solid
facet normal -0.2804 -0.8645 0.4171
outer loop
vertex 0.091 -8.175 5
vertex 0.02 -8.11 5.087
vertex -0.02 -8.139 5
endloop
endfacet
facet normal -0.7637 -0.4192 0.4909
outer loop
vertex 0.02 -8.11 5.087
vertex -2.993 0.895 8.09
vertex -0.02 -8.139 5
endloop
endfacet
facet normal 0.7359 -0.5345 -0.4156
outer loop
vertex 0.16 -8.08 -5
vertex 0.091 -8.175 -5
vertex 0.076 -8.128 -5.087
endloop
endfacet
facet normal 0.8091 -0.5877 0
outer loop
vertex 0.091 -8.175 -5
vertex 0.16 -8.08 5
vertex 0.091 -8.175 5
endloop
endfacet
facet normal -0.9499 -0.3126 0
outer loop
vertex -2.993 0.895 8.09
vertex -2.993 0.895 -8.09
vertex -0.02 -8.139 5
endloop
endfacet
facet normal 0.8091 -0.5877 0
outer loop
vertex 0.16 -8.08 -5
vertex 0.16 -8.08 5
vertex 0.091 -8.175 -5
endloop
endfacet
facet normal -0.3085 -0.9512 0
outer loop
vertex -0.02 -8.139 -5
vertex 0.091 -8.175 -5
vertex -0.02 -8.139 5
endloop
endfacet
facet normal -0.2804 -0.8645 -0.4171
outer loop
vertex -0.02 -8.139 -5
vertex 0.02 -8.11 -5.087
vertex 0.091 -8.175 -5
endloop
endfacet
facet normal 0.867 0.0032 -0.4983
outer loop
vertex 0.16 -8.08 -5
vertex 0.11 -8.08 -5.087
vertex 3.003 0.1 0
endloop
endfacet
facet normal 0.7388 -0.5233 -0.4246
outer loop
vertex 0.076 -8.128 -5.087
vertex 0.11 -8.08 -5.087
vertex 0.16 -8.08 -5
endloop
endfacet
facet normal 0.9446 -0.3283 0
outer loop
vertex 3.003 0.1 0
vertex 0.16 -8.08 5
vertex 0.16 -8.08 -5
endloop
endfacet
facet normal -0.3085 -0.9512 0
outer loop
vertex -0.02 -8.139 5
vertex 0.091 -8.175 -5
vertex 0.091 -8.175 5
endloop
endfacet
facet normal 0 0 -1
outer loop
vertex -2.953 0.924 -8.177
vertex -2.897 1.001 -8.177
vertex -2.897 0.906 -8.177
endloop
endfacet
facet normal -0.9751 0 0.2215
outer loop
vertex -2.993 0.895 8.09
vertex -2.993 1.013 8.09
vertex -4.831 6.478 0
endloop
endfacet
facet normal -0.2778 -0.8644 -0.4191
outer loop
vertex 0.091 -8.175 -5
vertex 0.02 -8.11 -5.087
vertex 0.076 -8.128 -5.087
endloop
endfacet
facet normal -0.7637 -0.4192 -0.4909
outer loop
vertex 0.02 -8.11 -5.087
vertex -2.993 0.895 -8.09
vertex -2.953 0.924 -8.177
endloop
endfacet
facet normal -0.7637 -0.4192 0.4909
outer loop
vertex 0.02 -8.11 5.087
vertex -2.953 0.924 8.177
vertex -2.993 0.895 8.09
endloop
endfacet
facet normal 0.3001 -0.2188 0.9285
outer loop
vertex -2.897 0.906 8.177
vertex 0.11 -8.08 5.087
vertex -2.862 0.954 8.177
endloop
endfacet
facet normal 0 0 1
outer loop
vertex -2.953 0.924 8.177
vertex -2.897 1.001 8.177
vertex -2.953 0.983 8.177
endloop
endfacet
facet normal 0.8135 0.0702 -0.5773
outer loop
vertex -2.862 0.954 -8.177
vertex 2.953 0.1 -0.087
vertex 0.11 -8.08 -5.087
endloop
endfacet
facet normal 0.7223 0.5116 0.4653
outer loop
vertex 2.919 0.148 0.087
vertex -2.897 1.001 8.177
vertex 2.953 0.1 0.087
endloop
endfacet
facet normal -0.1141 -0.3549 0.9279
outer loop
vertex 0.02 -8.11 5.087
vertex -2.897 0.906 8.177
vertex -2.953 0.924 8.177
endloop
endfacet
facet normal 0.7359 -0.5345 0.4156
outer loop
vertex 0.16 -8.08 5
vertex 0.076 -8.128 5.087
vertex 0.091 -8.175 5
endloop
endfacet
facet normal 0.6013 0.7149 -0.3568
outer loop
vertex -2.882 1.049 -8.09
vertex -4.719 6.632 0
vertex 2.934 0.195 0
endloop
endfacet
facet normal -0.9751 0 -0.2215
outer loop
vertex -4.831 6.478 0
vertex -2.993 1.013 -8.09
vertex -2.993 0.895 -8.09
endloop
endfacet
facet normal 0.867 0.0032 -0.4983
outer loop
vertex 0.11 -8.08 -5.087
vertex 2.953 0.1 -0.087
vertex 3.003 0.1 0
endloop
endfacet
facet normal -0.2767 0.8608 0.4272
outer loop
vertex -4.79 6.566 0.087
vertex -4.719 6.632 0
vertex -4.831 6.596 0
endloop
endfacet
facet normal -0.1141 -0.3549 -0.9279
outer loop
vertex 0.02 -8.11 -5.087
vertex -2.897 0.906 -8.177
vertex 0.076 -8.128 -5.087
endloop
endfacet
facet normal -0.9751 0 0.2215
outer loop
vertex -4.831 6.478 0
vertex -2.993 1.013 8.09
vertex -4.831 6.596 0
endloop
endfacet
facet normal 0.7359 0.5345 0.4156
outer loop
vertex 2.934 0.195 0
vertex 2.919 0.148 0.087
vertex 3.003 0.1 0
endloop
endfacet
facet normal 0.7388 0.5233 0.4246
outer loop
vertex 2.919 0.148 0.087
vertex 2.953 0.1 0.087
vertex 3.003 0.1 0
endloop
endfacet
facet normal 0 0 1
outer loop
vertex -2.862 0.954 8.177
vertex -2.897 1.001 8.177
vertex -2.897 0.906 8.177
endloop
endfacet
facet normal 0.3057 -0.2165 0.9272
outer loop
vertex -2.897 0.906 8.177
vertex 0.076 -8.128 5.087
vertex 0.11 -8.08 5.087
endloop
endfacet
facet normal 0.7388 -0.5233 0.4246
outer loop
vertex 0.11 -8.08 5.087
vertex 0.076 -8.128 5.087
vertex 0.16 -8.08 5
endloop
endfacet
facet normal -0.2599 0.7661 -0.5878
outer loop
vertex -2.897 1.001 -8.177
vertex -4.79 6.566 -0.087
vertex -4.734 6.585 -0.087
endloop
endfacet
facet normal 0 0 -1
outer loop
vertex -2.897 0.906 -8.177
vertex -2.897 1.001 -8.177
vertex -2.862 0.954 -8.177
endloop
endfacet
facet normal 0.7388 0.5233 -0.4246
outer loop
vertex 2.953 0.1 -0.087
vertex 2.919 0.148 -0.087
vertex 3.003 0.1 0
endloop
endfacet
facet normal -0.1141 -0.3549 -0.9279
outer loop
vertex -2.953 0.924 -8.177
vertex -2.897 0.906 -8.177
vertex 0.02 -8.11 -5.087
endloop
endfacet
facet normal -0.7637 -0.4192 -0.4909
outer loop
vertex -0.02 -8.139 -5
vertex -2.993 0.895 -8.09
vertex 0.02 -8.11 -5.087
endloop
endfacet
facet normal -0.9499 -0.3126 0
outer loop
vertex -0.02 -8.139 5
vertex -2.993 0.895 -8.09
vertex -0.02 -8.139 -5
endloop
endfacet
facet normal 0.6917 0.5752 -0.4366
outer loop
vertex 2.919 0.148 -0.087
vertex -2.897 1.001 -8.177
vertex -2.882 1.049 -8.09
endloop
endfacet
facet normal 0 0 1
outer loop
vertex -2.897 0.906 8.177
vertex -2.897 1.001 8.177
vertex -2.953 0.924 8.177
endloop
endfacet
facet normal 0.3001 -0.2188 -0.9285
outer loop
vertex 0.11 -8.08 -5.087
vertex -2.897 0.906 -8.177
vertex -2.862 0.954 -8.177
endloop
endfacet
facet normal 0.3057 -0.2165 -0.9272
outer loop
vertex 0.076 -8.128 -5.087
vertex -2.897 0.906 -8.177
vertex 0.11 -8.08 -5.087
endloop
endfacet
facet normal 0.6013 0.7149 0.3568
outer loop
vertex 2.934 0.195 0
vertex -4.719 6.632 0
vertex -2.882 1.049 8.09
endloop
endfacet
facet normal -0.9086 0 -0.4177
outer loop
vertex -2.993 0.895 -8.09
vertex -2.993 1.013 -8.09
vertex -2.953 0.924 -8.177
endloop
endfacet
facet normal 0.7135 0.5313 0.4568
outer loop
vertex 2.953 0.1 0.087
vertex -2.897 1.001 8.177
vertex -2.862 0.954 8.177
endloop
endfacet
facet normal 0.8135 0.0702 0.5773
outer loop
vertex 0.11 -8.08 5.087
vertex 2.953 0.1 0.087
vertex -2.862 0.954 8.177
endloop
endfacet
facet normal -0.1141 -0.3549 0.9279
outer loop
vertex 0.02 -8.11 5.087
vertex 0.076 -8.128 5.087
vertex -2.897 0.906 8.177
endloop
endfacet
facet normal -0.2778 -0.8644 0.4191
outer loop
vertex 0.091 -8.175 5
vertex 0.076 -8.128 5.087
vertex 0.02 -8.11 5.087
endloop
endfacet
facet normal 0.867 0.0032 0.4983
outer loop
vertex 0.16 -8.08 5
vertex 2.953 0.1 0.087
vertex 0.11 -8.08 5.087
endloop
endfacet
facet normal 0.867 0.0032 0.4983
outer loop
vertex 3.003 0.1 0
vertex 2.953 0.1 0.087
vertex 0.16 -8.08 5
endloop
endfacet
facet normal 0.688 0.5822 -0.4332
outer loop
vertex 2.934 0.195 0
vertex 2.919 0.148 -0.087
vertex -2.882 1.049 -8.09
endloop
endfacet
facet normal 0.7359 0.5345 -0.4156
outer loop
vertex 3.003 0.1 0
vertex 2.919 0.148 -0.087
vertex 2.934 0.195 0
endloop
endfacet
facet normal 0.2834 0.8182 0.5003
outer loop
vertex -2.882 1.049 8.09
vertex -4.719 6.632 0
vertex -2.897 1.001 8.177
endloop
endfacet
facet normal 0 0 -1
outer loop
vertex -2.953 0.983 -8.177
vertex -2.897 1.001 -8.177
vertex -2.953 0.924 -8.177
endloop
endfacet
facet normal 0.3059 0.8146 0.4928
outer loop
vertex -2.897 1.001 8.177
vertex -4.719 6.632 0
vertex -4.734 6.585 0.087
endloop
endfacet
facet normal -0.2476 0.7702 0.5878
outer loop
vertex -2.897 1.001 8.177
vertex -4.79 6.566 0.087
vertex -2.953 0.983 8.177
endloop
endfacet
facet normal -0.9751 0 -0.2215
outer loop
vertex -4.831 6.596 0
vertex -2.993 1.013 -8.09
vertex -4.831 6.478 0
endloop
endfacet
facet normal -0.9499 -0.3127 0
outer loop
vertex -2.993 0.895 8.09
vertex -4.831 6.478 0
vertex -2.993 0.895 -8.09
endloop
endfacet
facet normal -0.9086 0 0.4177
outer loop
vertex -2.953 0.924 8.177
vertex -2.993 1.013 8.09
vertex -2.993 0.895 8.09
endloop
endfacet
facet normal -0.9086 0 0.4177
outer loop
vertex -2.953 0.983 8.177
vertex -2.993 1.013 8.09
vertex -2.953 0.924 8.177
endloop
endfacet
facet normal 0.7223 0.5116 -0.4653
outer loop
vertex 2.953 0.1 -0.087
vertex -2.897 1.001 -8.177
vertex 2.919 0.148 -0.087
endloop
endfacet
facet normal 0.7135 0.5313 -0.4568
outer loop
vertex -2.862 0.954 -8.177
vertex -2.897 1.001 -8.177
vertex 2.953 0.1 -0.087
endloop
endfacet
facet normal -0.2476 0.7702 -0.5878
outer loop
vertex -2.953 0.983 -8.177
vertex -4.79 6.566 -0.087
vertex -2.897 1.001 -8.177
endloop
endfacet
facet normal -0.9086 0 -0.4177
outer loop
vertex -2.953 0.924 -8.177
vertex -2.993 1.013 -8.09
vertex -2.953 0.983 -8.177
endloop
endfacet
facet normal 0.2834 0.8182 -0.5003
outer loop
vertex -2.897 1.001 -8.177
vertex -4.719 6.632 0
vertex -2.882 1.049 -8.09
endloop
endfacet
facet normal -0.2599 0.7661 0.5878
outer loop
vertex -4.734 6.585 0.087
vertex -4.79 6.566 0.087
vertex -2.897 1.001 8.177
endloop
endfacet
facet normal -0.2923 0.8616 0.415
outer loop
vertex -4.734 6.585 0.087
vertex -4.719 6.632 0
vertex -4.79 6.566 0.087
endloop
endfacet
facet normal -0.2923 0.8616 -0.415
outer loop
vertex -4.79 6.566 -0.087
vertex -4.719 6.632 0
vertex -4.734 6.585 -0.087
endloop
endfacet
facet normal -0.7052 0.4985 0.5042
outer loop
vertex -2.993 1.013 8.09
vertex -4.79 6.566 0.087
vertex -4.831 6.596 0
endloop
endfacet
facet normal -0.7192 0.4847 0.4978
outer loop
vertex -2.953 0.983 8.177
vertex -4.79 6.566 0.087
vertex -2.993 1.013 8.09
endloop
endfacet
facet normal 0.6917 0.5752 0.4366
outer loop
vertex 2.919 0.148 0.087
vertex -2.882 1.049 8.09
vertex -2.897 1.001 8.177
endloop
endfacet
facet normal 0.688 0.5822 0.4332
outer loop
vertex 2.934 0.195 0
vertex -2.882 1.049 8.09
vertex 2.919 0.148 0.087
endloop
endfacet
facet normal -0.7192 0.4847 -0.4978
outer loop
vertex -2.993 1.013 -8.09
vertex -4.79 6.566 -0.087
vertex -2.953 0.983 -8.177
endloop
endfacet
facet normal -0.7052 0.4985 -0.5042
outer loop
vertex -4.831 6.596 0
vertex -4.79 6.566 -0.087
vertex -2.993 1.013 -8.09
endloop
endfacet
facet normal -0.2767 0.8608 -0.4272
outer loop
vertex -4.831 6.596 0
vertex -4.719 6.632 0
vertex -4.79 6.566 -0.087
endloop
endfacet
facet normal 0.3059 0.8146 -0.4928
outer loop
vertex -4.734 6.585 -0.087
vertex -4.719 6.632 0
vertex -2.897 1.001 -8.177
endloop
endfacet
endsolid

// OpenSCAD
// Auto-generated OpenSCAD file

    inner_points = 10*[[0.006041051977101475, -0.8080237563375162, 0.5000000000006635], [-0.29124754295317146, 0.09537426696641924, -0.8090169943752008], [-0.29124754295042443, 0.09537426696896514, 0.8090169943746941], [-0.47498199908503275, 0.6537049507402669, -8.199552148369094e-13], [0.006041051975403666, -0.8080237563390895, -0.49999999999933664], [0.2903071489285415, 0.010018287888955535, -1.106413997394639e-12]];

    outer_points = 10*[[-0.7978099914491895, -0.2625428334534335, -0.13482312819418532], [0.8017357049911781, -0.2625428334534335, 0.10907757649728182], [-0.49942562922089523, 0.687346061483792, -0.04166809798888336], [0.4891479777378736, 0.687346061483792, 0.10907082739049428], [0.006351937941033116, -0.8496064560607167, -0.04165717770470741], [-0.07915084916165496, -0.02604313074481797, 0.5190858316964722]];

    // Convex hull for inner set (I)
    module inner_hull() {
        hull() {
            for (p = inner_points) {
                translate(p) sphere(r=0.1);
            }
        }
    }

    // Convex hull for outer set (O) minus inner hull (O \ I)
    module outer_minus_inner() {
        difference() {
            hull() {
                for (p = outer_points) {
                    translate(p) sphere(r=0.1);
                }
            }
            inner_hull(); // Subtract inner hull
        }
    }

    // Convex hull for outer set (O) minus all translated inner hulls
    module outer_minus_AllTranslationInner() {
        difference() {
            hull() {
                for (p = outer_points) {
                    translate(p) sphere(r=0.1);
                }
            }
            hull() {
                translate([0,0,50]) inner_hull();
                translate([0,0,-50]) inner_hull();
            }; // Subtract translated inner hulls
        }
    }

    // Difference between outer_minus_inner and outer_minus_AllTranslationInner
    module outer_minus_inner_diff() {
        difference() {
            // Outer minus inner
            difference() {
                hull() {
                    for (p = outer_points) {
                        translate(p) sphere(r=0.1);
                    }
                }
                inner_hull();
            }

            // Subtract Outer minus AllTranslationInner
            difference() {
                hull() {
                    for (p = outer_points) {
                        translate(p) sphere(r=0.1);
                    }
                }
                hull() {
                    translate([0,0,50]) inner_hull();
                    translate([0,0,-50]) inner_hull();
                };
            }
        }
    }

    // Rendering all with colors applied
    color([1, 0, 0, 0.5]) inner_hull(); // Transparent red
    
